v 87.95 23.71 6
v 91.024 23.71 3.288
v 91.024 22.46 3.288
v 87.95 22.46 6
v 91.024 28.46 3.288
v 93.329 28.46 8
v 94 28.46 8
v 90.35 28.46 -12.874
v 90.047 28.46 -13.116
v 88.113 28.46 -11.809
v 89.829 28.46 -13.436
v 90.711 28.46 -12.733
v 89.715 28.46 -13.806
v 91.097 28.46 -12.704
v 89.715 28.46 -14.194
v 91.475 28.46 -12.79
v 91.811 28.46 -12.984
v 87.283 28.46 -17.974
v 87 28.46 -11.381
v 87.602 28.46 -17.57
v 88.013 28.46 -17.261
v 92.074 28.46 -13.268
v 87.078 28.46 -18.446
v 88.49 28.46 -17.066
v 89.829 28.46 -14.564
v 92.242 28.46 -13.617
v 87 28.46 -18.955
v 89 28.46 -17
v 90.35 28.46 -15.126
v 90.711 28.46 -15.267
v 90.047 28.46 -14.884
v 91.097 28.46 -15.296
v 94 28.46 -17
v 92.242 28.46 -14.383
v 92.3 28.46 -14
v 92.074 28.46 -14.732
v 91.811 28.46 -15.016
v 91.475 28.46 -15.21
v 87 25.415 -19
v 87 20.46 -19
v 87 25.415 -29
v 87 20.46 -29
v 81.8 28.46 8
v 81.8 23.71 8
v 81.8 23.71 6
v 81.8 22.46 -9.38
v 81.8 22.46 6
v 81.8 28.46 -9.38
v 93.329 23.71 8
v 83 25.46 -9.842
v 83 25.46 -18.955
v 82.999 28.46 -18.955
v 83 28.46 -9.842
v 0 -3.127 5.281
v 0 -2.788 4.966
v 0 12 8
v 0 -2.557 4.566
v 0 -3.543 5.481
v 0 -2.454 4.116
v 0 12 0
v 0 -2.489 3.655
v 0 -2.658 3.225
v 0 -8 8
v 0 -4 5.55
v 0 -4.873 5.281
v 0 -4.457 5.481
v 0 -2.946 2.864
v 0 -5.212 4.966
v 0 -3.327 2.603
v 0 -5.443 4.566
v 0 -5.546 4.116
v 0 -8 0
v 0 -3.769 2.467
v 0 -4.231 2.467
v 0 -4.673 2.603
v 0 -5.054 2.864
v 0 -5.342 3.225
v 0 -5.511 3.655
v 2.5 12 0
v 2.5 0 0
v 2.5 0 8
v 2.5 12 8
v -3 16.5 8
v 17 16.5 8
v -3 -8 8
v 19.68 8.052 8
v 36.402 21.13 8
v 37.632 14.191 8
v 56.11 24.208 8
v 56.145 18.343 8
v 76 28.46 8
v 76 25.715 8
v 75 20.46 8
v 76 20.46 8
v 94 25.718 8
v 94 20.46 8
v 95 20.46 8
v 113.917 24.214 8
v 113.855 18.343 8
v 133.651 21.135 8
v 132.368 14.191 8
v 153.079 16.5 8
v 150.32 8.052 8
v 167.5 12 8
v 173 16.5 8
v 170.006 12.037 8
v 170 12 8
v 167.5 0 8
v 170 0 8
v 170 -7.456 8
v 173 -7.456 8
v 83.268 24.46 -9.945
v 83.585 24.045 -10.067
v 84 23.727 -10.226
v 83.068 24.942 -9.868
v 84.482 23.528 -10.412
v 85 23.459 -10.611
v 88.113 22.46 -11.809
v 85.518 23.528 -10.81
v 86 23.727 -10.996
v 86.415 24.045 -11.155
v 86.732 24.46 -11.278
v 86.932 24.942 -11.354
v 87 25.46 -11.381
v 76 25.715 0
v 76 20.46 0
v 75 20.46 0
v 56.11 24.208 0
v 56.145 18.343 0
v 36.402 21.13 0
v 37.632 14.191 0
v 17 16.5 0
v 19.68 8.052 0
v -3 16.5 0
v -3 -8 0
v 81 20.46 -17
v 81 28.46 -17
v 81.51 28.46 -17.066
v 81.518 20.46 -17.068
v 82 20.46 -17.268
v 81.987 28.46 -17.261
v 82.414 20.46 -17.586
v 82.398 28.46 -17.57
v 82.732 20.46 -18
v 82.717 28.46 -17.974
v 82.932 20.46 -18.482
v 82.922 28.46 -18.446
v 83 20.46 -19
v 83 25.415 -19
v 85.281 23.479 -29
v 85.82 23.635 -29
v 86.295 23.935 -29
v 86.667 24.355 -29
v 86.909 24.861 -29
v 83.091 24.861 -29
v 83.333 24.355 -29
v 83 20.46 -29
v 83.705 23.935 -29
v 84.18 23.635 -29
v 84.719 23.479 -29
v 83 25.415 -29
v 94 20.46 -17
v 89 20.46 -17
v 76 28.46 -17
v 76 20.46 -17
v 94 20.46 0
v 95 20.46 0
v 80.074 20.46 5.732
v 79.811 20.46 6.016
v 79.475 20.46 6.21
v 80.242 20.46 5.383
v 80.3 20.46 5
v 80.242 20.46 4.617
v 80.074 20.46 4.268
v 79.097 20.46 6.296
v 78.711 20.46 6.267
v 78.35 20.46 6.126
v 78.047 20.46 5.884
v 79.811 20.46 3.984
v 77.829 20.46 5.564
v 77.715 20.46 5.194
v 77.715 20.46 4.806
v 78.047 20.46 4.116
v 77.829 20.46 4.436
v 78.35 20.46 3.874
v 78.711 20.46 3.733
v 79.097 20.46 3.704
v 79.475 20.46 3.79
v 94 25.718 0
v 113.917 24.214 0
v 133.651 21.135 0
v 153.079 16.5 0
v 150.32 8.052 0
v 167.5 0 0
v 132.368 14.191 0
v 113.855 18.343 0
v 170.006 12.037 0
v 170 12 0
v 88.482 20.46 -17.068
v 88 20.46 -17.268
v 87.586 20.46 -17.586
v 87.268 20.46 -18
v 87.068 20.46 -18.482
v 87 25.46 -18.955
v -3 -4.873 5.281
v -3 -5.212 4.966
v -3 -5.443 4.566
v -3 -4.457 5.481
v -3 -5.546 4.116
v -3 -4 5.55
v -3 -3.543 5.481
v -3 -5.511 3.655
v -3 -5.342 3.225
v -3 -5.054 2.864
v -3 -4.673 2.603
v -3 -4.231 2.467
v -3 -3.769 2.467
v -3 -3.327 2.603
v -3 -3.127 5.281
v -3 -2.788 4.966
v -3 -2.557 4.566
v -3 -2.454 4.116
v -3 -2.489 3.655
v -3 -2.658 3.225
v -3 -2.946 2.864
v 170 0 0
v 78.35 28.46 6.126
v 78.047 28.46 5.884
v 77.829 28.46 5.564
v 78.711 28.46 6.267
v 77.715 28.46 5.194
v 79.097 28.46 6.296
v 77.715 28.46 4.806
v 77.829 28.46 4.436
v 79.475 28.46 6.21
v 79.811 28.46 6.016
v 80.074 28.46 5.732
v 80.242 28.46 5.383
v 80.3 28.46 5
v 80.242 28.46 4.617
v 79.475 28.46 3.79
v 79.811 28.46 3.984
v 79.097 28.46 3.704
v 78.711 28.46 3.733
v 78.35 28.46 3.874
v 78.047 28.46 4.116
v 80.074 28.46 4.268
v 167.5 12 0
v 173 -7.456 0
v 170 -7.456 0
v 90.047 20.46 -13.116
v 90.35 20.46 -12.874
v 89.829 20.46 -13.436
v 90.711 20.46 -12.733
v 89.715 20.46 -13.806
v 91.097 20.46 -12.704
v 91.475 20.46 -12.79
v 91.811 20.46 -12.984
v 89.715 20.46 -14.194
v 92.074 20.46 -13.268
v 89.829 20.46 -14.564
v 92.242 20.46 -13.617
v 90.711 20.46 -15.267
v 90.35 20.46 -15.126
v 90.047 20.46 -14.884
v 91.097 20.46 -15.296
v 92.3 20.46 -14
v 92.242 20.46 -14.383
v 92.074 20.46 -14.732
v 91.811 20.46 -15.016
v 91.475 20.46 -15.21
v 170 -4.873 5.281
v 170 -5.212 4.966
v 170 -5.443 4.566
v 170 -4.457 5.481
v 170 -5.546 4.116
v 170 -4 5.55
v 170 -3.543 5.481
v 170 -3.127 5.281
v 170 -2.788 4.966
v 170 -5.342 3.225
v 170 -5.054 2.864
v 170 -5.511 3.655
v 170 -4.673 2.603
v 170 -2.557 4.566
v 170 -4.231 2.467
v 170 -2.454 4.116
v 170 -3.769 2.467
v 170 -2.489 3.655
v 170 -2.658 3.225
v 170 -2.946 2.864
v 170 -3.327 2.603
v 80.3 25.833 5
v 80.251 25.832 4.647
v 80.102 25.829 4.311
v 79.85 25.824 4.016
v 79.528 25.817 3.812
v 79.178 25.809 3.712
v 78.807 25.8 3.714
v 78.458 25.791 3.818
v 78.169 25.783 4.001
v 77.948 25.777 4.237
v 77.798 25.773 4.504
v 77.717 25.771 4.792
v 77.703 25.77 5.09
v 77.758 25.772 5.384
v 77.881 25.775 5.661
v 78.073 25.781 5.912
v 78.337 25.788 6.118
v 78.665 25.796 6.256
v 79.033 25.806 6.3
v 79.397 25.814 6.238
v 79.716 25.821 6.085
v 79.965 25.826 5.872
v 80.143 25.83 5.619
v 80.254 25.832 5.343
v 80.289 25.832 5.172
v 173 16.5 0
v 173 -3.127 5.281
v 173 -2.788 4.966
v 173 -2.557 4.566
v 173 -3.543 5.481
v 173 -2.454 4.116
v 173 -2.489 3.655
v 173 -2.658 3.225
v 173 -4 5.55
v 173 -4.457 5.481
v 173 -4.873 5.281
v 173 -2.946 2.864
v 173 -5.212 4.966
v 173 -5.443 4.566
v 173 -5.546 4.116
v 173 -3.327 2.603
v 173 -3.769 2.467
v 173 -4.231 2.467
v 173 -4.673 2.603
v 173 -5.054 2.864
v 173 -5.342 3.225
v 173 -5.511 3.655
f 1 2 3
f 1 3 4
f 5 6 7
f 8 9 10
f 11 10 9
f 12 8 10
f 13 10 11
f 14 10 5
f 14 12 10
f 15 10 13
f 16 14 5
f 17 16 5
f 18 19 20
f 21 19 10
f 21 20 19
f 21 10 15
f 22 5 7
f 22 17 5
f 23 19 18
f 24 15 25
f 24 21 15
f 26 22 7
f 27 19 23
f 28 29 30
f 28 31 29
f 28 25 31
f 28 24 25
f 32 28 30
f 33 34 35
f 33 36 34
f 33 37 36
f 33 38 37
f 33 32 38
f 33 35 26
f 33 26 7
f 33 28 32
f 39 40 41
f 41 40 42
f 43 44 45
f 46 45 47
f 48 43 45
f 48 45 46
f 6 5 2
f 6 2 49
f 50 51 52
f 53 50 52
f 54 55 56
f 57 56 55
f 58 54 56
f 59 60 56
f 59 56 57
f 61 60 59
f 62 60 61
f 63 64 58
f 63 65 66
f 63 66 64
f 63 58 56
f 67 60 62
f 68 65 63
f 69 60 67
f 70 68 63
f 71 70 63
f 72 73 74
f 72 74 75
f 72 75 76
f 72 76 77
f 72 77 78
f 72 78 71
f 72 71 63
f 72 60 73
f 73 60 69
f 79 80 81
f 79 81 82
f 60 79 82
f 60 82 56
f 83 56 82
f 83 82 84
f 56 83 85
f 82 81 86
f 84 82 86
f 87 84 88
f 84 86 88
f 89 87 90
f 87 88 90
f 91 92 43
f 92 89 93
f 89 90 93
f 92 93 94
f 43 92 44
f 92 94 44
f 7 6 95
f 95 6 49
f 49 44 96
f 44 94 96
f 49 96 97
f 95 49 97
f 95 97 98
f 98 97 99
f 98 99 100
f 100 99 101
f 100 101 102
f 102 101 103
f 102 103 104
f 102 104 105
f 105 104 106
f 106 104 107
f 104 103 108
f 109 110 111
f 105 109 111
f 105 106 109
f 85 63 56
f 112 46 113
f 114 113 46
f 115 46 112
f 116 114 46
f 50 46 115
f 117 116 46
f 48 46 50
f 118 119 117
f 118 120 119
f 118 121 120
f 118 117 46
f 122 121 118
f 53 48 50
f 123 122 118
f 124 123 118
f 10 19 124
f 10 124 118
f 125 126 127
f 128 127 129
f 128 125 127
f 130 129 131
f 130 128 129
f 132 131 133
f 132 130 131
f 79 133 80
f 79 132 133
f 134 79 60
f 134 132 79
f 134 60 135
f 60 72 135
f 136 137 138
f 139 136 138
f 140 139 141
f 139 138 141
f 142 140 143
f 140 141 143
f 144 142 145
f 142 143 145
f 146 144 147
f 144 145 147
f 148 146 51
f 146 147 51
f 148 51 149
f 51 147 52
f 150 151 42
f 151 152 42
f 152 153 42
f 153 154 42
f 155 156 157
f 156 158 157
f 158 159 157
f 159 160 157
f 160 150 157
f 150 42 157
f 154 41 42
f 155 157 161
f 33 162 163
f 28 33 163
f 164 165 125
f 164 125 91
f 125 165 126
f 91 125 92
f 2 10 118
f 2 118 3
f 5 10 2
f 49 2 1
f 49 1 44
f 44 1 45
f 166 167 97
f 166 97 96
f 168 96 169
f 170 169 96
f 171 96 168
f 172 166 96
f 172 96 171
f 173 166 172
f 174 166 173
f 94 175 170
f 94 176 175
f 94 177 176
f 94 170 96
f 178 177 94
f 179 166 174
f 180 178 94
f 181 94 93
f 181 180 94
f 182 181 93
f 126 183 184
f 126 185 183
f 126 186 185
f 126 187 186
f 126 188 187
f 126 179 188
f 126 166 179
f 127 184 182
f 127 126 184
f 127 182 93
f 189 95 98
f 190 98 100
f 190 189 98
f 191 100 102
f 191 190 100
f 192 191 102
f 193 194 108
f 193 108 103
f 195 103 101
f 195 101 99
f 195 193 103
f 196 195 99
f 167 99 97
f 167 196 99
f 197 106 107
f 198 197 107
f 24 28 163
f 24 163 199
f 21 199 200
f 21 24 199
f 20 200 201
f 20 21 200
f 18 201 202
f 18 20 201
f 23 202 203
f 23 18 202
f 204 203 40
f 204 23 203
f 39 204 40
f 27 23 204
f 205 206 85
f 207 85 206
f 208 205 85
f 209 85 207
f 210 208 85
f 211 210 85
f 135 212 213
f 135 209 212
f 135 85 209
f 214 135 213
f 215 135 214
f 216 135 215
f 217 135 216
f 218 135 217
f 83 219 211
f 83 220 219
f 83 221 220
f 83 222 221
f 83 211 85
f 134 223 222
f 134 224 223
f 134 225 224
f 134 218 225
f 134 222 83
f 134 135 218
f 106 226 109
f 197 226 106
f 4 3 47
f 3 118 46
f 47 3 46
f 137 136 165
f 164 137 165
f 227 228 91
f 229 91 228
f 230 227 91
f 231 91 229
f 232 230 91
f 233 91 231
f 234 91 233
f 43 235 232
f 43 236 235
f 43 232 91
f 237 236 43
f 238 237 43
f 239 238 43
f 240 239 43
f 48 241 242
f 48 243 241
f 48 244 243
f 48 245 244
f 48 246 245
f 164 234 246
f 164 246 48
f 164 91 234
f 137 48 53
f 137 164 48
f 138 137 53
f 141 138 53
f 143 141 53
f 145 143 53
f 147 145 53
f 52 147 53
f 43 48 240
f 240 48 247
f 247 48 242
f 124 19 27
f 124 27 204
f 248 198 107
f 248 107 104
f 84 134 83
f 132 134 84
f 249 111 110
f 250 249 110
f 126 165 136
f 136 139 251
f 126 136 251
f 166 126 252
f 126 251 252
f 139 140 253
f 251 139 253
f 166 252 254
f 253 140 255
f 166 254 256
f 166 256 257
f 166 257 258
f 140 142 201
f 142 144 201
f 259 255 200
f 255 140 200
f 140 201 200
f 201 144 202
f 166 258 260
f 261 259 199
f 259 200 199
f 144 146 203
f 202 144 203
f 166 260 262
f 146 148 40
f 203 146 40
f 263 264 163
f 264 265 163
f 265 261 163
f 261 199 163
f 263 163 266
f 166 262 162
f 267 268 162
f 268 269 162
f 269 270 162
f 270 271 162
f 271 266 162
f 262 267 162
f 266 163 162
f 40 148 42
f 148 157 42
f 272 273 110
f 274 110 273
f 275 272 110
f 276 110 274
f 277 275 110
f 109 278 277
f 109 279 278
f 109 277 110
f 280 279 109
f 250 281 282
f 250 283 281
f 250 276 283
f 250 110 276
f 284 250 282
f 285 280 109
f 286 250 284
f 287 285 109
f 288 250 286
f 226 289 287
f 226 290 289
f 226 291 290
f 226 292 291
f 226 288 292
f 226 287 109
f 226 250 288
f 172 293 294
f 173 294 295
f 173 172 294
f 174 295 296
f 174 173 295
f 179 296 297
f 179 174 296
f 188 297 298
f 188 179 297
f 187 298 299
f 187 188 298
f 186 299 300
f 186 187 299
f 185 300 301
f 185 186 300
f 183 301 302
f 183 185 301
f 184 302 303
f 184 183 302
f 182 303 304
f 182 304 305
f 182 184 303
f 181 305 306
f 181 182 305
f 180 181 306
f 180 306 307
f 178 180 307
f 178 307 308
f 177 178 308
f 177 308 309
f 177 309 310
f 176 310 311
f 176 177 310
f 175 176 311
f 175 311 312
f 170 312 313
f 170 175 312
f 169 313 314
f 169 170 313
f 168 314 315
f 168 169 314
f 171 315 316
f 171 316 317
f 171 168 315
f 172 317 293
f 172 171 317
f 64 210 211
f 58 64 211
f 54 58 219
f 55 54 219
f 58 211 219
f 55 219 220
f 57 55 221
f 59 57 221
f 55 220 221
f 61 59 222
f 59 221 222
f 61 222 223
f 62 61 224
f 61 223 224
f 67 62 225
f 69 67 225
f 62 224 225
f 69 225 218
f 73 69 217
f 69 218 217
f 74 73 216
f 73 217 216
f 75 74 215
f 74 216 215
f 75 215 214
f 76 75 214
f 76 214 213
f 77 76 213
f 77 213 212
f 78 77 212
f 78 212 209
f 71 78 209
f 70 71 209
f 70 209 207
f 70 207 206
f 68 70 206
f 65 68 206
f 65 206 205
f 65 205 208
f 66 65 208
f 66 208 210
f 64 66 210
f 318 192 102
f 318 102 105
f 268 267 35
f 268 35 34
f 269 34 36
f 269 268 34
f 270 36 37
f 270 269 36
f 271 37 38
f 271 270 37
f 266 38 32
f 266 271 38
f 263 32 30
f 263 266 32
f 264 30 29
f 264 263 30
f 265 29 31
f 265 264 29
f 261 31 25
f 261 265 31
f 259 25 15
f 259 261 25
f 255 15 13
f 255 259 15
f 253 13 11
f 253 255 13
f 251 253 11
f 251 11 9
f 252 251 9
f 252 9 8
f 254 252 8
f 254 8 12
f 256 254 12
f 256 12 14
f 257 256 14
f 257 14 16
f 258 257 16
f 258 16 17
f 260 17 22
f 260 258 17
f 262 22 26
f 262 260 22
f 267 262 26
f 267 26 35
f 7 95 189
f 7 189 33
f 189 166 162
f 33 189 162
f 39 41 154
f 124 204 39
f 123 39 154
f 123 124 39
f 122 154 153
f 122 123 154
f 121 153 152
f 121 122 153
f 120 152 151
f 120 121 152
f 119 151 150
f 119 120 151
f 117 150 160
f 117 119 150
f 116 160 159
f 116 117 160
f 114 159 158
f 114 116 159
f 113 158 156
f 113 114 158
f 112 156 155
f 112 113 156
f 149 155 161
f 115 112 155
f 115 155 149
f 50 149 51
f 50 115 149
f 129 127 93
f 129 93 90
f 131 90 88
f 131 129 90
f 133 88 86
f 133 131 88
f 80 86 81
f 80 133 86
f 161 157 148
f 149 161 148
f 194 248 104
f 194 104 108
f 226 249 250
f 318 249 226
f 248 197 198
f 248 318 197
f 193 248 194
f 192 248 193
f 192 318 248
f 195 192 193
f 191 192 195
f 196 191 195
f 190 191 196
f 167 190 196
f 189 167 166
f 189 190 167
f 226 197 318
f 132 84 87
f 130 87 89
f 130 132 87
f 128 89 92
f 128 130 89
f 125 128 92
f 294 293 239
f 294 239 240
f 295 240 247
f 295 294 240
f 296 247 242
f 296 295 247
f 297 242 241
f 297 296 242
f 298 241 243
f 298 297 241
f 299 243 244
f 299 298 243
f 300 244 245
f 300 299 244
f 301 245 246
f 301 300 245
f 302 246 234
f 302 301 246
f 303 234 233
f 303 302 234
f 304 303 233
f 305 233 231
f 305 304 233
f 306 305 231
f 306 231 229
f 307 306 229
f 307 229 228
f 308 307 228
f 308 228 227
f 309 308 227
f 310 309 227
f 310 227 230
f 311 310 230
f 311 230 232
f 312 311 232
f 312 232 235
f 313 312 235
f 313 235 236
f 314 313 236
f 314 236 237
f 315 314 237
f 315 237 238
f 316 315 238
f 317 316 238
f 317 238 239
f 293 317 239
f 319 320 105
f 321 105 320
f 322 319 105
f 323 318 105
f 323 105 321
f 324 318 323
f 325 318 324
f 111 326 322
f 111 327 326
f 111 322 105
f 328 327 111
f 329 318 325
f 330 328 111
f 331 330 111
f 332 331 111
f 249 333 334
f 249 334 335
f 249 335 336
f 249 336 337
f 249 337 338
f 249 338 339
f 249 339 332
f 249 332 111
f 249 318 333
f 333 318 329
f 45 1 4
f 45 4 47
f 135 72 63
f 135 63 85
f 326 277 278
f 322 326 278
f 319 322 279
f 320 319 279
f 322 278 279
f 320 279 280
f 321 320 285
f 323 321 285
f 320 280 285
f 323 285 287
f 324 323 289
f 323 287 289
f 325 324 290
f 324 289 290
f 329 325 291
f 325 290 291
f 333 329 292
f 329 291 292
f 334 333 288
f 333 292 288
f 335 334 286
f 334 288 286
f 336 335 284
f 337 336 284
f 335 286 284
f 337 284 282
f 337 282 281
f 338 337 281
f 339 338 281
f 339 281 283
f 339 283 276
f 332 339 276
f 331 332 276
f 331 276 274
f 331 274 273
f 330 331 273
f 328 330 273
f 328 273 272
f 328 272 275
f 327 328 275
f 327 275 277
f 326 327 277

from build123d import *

# Parameters (mm, degrees)
BOSS_EXTRUDE1_DEPTH     = 8
SKETCH2_R               = 1.55
CUT_EXTRUDE1_DEPTH      = 177
BOSS_EXTRUDE3_START     = 20.459902
SKETCH3_R               = 1.3
BOSS_EXTRUDE3_DEPTH     = 8
CUT_EXTRUDE2_START      = -2
CUT_EXTRUDE2_DEPTH      = 40
SKETCH3_3_R             = 1.3
CUT_EXTRUDE3_DEPTH      = 29.4599021
CUT_EXTRUDE3_DEPTH_BACK = 9
CUT_EXTRUDE4_DEPTH      = 6
CUT_EXTRUDE5_DEPTH      = 4.75
FILLET1_R               = 2


with BuildPart() as part:
    # Sketch1 → Boss-Extrude1 (new body)
    with BuildSketch(Plane.XY):
        with BuildLine():
            Line((-3, 0), (-3, 16.5))
            Line((-3, 16.5), (17, 16.5))
            ThreePointArc((17, 16.5), (85.039654136, 25.877266165), (153.079308271, 16.5))
            Line((153.079308271, 16.5), (173, 16.5))
            Line((173, 16.5), (173, 0.544153422))
            Line((173, 0.544153422), (173, -7.455846578))
            Line((173, -7.455846578), (170, -7.455846578))
            Line((170, -7.455846578), (170, 0))
            Line((170, 0), (170.005951762, 12.036791894))
            Line((170.005951762, 12.036791894), (170, 12))
            Line((170, 12), (167.5, 12))
            Line((167.5, 12), (167.5, 0))
            ThreePointArc((167.5, 0), (132.367862473, 14.191115036), (95, 20.459901787))
            Line((95, 20.459901787), (75, 20.459901787))
            ThreePointArc((75, 20.459901787), (37.632137527, 14.191115036), (2.5, 0))
            Line((2.5, 0), (2.5, 12))
            Line((2.5, 12), (0, 12))
            Line((0, 12), (0, 0))
            Line((0, 0), (0, -8))
            Line((0, -8), (-3, -8))
            Line((-3, -8), (-3, 0))
        make_face()
    extrude(amount=BOSS_EXTRUDE1_DEPTH)

    # Sketch2 → Cut-Extrude1 (cut, through all)
    with BuildSketch(Plane.ZY.offset(3)):
        with Locations((4, -4)):
            Circle(SKETCH2_R)
    extrude(amount=-CUT_EXTRUDE1_DEPTH, mode=Mode.SUBTRACT)

    # Sketch3 → Boss-Extrude3 (add)
    with BuildSketch(Plane(origin=(0, 0, 0), x_dir=(1, 0, 0), z_dir=(0, 1, 0)).offset(BOSS_EXTRUDE3_START)):
        Polygon((94, 17), (87, 17), (87, 29), (83, 29), (83, 17), (76, 17), (76, -8), (94, -8), align=None)
        with Locations((91, 14)):
            Circle(SKETCH3_R, mode=Mode.SUBTRACT)
        with Locations((79, -5)):
            Circle(SKETCH3_R, mode=Mode.SUBTRACT)
    extrude(amount=BOSS_EXTRUDE3_DEPTH)

    # Sketch5 → Cut-Extrude2 (cut)
    with BuildSketch(Plane.XY.offset(8).offset(CUT_EXTRUDE2_START)):
        with BuildLine():
            Line((82.9995, 25.459901787), (82.9995, 28.459901787))
            Line((82.9995, 28.459901787), (87.0005, 28.459901787))
            Line((87.0005, 28.459901787), (87.0005, 25.459901787))
            ThreePointArc((87.0005, 25.459901787), (85, 23.459401787), (82.9995, 25.459901787))
        make_face()
    extrude(amount=-CUT_EXTRUDE2_DEPTH, mode=Mode.SUBTRACT)

    # Sketch3<3> → Cut-Extrude3 (cut, two sides)
    with BuildSketch(Plane(origin=(0, 0, 0), x_dir=(1, 0, 0), z_dir=(0, 1, 0))) as cut_extrude3_sk:
        with Locations((79, -5)):
            Circle(SKETCH3_3_R)
    extrude(amount=CUT_EXTRUDE3_DEPTH, mode=Mode.SUBTRACT)
    extrude(cut_extrude3_sk.sketch, amount=-CUT_EXTRUDE3_DEPTH_BACK, mode=Mode.SUBTRACT)

    # Sketch6 → Cut-Extrude4 (cut)
    with BuildSketch(Plane(origin=(0, 28.459901787, 0), x_dir=(1, 0, 0), z_dir=(0, 1, 0))):
        Polygon((81.7995, 9.38), (88.113465558, 11.808798865), (91.0245, -3.288104906), (87.9495, -6), (81.7995, -6), align=None)
    extrude(amount=-CUT_EXTRUDE4_DEPTH, mode=Mode.SUBTRACT)

    # Sketch7 → Cut-Extrude5 (cut)
    with BuildSketch(Plane(origin=(0, 28.459901787, 0), x_dir=(1, 0, 0), z_dir=(0, 1, 0))):
        Polygon((91.0245, -3.288104906), (93.328799585, -8), (81.7995, -8), (81.7995, -6), (87.9495, -6), align=None)
    extrude(amount=-CUT_EXTRUDE5_DEPTH, mode=Mode.SUBTRACT)

    # Fillet1
    fillet1_edges = [part.edges().sort_by_distance(p)[0] for p in [
        (87, 22.937539816, -17),
        (83, 22.937539816, -17),
    ]]
    fillet(fillet1_edges, radius=FILLET1_R)


solid = part.part
